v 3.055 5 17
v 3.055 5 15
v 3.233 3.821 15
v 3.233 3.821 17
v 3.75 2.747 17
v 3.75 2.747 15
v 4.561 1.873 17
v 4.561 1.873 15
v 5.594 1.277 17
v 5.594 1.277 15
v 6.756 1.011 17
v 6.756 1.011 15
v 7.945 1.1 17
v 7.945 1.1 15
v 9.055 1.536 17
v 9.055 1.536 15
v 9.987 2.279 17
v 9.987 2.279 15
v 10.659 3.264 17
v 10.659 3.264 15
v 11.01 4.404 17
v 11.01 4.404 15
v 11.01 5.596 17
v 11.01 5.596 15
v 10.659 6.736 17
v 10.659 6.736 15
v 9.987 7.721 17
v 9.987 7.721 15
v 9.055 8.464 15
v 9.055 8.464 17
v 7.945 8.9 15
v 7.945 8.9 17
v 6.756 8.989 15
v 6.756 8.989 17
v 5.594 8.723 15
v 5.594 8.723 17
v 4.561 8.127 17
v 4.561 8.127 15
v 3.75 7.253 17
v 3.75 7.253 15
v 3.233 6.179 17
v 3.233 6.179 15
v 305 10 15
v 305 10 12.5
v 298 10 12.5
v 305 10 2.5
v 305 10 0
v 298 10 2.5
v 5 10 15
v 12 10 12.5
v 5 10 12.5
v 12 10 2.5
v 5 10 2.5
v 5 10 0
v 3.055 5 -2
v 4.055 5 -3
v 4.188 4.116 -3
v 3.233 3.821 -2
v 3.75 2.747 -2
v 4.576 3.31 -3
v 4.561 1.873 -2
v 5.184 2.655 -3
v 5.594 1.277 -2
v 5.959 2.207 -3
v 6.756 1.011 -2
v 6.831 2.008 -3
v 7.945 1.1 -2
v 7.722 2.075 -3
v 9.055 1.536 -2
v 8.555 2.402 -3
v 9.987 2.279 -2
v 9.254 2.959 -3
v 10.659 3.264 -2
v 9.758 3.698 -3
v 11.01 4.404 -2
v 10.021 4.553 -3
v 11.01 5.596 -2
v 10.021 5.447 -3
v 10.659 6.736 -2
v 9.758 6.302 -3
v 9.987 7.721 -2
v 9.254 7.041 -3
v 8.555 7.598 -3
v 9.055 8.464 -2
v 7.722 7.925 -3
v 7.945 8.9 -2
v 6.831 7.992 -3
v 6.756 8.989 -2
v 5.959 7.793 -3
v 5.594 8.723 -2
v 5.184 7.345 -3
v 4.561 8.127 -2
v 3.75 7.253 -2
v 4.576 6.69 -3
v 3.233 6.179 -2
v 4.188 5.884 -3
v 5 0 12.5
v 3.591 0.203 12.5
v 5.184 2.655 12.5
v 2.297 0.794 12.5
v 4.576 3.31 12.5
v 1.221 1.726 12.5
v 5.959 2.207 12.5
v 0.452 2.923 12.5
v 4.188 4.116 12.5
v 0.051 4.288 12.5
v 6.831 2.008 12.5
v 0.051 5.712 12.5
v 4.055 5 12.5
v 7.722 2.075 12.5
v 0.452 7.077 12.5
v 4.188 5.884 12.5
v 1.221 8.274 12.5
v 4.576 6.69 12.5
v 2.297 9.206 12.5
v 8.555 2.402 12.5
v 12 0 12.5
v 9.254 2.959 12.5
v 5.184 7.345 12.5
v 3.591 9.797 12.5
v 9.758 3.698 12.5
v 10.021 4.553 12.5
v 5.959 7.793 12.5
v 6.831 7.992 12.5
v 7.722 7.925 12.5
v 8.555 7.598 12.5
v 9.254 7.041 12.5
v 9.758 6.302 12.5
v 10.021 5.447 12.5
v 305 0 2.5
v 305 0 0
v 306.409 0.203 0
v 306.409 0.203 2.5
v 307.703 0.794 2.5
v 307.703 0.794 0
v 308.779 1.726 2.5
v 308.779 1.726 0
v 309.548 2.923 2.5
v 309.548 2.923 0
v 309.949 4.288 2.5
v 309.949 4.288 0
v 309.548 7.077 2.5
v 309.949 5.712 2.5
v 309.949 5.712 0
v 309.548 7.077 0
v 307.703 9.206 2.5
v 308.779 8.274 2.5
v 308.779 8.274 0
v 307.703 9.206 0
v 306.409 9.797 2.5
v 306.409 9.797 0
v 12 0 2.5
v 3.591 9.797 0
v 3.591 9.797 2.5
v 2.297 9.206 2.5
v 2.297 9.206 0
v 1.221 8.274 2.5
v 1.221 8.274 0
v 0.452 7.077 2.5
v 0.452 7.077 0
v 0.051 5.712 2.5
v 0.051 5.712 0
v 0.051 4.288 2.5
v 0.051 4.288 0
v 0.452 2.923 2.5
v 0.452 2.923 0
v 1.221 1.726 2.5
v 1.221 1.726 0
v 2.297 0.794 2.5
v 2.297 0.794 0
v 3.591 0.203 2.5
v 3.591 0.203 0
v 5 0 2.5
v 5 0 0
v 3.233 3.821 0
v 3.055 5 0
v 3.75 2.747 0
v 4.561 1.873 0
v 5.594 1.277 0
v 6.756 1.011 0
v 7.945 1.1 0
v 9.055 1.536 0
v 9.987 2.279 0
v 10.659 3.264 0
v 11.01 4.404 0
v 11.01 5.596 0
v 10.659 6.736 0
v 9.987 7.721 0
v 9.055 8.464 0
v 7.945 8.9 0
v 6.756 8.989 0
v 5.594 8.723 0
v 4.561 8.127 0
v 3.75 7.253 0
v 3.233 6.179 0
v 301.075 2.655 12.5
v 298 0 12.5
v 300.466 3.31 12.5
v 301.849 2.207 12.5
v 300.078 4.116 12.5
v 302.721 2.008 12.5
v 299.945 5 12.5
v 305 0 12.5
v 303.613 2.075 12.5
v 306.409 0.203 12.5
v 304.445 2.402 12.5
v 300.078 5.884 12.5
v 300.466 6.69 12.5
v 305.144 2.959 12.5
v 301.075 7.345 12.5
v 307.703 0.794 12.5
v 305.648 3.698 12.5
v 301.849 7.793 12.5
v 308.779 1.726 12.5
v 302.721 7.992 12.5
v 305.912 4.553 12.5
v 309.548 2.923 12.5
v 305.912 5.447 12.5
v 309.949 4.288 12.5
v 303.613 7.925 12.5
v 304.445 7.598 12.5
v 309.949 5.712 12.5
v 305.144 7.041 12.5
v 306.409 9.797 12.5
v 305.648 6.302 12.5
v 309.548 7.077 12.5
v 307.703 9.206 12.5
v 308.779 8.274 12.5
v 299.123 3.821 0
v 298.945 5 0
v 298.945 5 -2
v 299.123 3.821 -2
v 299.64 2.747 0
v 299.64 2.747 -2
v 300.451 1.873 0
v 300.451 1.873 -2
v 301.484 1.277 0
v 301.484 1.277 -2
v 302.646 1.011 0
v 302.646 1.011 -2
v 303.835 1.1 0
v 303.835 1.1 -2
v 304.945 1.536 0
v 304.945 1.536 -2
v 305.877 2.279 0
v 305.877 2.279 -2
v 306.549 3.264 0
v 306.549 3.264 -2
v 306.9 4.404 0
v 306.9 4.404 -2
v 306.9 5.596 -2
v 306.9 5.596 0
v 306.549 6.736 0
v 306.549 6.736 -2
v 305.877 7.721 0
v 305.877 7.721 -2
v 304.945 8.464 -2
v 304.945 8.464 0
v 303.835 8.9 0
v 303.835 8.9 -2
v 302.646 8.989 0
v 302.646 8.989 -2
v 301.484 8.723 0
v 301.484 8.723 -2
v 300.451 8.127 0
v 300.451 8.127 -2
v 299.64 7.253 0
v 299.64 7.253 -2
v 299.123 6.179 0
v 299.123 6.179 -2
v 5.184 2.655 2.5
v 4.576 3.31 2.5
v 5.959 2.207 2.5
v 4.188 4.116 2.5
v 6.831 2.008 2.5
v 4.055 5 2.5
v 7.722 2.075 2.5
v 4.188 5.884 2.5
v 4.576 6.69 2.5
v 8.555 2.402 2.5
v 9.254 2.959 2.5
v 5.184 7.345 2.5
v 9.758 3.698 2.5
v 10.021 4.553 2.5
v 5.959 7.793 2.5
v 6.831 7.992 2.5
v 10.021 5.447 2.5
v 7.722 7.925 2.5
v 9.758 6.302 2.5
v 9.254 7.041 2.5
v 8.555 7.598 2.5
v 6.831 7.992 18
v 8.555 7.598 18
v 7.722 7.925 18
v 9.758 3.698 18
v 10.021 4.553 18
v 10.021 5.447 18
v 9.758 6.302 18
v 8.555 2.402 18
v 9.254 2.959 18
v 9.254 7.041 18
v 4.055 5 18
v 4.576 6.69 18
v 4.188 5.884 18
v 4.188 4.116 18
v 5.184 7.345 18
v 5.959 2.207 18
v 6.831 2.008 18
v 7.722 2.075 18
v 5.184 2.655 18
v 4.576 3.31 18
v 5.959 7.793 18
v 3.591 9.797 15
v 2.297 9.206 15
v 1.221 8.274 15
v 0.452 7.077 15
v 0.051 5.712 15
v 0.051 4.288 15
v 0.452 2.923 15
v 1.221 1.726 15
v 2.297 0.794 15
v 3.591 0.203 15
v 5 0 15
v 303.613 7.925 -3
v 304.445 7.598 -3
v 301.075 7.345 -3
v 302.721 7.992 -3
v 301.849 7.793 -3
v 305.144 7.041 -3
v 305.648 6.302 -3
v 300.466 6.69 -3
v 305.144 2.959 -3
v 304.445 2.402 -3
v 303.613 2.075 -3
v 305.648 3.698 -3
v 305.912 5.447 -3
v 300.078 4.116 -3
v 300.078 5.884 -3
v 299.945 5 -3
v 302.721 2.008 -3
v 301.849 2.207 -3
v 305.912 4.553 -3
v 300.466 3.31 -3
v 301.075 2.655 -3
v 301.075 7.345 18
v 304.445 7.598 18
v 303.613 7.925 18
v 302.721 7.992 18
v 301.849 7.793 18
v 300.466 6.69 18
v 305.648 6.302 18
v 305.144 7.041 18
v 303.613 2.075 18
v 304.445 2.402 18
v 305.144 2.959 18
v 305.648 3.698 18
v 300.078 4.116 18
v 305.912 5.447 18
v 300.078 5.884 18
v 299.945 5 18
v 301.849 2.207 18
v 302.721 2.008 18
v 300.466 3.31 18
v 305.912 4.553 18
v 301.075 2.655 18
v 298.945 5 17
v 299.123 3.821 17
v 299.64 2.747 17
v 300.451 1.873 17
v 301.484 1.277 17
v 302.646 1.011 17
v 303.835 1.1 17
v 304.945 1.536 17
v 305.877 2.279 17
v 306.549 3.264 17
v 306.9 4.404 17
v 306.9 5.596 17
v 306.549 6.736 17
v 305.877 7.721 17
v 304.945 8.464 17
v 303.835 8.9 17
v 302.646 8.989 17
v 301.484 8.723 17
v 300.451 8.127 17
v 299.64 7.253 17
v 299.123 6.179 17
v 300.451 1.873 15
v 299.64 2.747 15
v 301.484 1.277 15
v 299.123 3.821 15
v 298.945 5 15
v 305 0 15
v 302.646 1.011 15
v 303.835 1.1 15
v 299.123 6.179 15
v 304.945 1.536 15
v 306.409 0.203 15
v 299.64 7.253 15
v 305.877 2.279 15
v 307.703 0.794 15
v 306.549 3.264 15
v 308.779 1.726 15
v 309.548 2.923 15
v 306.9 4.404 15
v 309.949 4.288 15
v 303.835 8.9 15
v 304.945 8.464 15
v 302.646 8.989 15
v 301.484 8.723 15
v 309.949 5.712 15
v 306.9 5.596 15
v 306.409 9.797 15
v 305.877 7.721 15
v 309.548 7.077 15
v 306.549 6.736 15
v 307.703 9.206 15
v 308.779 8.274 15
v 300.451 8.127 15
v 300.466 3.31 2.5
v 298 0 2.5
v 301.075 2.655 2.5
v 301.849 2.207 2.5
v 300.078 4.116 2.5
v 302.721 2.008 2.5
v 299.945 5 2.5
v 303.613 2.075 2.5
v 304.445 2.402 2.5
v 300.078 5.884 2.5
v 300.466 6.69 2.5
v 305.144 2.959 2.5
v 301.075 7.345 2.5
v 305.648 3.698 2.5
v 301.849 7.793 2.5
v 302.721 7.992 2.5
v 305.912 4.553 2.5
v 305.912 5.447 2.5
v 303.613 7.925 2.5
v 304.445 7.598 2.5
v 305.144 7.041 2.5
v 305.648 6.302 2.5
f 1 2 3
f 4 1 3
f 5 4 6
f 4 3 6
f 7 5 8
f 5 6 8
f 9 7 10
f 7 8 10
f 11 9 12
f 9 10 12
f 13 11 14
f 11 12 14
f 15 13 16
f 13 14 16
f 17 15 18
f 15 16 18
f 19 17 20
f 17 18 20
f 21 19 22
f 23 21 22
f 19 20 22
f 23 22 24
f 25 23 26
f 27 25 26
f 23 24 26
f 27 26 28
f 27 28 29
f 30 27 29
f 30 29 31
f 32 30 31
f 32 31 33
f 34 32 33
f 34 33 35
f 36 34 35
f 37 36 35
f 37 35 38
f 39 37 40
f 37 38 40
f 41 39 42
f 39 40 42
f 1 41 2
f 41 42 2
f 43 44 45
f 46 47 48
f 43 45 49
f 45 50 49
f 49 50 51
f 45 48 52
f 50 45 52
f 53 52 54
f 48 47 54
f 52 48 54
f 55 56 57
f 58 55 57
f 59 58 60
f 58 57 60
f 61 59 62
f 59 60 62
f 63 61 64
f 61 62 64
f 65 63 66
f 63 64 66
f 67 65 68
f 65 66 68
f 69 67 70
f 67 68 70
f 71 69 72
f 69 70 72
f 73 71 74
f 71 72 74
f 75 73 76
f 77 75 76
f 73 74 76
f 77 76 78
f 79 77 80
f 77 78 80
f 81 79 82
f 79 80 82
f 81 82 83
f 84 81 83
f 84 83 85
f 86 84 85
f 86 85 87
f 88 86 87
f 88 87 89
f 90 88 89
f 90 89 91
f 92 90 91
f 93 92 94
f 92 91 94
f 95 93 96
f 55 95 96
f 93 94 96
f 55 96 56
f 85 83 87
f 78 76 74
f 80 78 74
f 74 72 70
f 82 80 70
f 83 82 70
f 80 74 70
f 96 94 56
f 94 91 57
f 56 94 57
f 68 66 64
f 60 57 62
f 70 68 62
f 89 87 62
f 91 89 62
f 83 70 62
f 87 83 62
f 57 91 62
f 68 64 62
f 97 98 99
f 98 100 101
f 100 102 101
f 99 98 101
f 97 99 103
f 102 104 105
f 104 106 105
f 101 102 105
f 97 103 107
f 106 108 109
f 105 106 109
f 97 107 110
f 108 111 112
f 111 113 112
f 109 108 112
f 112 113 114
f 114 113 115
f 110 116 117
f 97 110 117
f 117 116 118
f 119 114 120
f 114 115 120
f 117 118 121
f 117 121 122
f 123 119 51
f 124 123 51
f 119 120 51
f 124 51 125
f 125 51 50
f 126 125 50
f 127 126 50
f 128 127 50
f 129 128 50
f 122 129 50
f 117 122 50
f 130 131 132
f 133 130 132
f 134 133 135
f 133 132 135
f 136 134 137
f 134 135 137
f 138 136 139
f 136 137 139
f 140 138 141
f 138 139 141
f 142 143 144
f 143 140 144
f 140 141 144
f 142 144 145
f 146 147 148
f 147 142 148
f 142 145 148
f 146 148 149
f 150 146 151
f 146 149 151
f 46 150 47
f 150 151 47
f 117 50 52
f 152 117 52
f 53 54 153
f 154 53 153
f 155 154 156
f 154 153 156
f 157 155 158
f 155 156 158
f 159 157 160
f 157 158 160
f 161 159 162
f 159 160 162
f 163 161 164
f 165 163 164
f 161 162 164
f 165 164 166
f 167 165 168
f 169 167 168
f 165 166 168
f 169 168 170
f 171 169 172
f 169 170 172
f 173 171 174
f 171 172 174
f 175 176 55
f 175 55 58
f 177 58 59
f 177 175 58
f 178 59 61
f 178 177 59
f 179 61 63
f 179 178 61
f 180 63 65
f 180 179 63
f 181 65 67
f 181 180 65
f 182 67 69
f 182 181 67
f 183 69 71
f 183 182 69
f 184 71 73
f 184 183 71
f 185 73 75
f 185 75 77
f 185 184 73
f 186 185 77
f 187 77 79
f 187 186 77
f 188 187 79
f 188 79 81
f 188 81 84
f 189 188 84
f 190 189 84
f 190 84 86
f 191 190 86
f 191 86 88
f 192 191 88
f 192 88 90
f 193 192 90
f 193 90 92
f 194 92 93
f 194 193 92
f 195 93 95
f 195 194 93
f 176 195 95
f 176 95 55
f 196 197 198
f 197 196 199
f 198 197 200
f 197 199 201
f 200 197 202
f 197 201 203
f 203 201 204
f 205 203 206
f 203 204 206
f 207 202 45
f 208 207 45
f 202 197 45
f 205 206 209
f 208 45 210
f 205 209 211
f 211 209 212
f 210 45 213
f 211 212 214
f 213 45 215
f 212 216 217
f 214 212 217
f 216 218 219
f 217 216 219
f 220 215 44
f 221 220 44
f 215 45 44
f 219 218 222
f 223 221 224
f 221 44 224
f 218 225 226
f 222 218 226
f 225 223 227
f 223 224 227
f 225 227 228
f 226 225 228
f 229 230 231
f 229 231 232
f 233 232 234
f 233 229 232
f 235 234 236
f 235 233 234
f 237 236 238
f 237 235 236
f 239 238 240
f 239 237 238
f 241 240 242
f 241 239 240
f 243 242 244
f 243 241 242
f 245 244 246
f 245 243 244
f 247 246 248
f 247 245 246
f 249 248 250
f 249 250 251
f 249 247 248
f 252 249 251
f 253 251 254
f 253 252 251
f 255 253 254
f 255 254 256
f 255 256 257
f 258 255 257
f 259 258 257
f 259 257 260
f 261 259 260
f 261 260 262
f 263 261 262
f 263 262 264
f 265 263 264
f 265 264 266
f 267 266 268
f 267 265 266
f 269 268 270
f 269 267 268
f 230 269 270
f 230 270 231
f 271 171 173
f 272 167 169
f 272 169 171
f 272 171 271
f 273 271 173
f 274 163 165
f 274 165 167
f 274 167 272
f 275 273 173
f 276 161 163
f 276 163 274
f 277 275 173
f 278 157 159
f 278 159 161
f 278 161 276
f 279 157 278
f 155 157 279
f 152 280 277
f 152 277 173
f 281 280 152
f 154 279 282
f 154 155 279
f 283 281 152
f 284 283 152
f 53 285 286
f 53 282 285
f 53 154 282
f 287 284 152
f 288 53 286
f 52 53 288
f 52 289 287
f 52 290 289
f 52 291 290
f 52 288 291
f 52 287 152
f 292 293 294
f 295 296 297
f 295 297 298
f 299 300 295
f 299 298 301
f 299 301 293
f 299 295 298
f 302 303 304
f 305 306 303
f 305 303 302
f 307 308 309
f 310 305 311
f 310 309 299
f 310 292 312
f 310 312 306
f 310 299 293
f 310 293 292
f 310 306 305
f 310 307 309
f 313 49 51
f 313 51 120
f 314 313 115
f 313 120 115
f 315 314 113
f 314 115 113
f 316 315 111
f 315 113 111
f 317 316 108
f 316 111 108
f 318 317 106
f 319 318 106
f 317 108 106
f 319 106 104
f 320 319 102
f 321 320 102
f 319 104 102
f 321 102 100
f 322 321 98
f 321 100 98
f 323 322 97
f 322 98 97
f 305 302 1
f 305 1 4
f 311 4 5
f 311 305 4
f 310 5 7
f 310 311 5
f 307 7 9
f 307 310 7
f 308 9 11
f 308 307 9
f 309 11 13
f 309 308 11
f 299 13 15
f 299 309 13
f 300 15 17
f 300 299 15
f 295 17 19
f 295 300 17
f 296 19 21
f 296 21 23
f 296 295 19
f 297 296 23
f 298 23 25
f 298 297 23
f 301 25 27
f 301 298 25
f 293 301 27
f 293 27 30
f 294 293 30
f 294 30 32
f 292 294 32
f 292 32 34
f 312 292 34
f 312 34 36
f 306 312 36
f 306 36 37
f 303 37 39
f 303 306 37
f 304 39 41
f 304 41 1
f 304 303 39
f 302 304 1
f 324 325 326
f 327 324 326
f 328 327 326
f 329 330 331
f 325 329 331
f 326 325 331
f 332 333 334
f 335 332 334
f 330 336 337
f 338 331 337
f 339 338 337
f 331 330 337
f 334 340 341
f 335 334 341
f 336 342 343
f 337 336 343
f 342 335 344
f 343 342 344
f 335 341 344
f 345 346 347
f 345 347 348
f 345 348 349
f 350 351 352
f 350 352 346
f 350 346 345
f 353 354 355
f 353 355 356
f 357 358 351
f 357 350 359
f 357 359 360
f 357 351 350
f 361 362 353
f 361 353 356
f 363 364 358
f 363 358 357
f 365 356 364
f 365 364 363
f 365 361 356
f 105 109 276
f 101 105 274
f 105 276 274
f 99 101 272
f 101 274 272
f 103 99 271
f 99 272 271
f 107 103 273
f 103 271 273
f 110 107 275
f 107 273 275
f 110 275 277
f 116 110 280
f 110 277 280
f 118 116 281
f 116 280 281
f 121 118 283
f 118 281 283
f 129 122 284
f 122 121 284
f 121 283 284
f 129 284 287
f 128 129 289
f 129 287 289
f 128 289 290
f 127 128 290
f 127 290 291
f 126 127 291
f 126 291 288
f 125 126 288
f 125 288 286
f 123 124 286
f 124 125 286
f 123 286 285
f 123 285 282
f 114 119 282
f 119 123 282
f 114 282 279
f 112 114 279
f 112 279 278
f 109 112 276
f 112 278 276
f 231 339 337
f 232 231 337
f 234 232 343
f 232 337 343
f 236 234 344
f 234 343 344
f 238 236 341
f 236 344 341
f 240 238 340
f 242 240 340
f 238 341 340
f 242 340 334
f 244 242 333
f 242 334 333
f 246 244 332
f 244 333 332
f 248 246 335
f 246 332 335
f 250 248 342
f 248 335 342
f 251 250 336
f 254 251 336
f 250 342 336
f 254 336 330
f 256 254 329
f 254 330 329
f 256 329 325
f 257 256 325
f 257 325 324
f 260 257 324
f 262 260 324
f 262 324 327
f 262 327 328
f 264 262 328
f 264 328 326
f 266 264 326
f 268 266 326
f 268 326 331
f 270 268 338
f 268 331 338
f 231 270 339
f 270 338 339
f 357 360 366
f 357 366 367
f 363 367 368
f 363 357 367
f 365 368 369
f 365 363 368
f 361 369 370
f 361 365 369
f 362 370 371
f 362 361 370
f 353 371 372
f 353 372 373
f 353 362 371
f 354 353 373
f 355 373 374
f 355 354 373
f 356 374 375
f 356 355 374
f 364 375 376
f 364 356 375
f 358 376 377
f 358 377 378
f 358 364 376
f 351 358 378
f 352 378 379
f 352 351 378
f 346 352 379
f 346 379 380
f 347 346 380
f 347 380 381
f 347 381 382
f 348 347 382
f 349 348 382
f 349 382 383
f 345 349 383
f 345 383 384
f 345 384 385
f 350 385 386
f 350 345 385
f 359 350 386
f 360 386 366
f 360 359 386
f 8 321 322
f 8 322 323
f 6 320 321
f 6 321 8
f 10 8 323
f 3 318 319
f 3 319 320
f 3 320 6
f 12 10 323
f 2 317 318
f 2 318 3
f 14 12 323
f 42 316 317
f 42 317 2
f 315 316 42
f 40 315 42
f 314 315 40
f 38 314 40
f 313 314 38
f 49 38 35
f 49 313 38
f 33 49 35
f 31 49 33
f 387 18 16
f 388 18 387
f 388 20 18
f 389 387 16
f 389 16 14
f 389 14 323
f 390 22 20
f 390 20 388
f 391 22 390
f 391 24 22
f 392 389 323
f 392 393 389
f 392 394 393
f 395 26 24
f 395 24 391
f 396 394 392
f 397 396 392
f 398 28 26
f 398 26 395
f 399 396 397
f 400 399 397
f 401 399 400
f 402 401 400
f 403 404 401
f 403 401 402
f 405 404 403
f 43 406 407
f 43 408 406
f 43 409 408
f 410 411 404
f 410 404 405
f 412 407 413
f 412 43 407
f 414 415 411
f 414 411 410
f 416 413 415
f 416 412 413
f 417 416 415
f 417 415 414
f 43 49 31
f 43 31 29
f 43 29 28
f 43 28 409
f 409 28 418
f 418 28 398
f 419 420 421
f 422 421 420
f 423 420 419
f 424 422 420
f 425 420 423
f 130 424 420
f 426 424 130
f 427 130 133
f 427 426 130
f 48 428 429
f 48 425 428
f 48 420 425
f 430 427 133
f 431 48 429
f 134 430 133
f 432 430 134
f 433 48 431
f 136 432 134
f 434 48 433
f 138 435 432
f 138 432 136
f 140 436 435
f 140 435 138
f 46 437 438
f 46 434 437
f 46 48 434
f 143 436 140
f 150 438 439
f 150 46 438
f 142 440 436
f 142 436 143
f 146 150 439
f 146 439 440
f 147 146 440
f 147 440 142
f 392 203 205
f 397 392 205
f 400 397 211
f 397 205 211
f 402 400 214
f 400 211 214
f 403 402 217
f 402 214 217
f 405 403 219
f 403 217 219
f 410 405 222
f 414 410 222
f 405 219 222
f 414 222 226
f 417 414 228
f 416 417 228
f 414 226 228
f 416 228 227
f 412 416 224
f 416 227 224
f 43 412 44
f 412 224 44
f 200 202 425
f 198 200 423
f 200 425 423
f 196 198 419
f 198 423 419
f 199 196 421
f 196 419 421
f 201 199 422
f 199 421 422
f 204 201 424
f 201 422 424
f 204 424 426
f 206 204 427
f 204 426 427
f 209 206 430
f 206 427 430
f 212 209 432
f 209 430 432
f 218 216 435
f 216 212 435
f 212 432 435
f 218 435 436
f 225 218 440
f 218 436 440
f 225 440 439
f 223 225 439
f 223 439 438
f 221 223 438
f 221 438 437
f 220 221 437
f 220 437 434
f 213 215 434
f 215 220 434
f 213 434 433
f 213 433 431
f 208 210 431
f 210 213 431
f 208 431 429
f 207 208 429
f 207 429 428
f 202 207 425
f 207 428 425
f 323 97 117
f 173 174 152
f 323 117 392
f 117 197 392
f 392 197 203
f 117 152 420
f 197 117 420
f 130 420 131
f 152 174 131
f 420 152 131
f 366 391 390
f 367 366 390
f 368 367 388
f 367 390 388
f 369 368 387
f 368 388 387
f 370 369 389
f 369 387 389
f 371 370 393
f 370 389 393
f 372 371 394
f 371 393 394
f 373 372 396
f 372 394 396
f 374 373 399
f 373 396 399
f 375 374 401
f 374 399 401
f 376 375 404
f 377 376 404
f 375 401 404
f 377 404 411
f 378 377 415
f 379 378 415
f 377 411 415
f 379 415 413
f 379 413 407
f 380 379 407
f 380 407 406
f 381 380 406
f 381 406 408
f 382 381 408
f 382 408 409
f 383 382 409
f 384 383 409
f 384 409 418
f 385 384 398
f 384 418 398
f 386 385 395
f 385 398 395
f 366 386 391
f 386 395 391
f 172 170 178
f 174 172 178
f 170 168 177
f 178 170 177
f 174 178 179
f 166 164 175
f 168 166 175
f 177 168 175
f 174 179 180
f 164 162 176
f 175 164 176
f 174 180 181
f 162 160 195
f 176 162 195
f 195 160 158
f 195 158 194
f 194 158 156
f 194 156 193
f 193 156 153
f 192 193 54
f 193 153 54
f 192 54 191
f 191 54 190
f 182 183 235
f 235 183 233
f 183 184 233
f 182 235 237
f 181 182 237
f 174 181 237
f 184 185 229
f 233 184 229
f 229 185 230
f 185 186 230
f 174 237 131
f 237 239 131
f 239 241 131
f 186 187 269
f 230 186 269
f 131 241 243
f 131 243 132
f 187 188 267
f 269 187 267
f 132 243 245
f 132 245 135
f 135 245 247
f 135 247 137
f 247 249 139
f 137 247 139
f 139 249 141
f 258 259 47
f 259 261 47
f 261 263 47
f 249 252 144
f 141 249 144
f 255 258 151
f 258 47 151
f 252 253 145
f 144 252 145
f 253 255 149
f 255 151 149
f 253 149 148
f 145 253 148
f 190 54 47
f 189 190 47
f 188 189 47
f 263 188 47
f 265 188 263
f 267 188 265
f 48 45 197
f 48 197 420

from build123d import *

# Parameters (mm, degrees)
BOSS_EXTRU_1_DEPTH           = 15
ENL_V_MAT_EXTRU_1_REACH      = 312.524
ESQUISSE2_W                  = 12
ESQUISSE2_H                  = 10
BOSS_EXTRU_2_REACH           = 312.413
ESQUISSE3_R                  = 3
ESQUISSE4_R                  = 4
BOSS_EXTRU_3_DEPTH           = 3
CHANFREIN1_SIZE              = 1
CHANFREIN1_OF_SYM_TRIE1_SIZE = 1


with BuildPart() as part:
    # Esquisse1 → Boss.-Extru.1 (new body)
    with BuildSketch(Plane.XY):
        with BuildLine():
            Line((5, 0), (305, 0))
            ThreePointArc((305, 0), (310, 5), (305, 10))
            Line((305, 10), (5, 10))
            ThreePointArc((5, 10), (0, 5), (5, 0))
        make_face()
    extrude(amount=BOSS_EXTRU_1_DEPTH)

    # Esquisse2 → Enlèv. mat.-Extru.1 (cut, up to next)
    with BuildSketch(Plane(origin=(0, 10, 0), x_dir=(1, 0, 0), z_dir=(0, 1, 0)), mode=Mode.PRIVATE) as enl_v_mat_extru_1_sk1:
        with Locations((6, -7.5)):
            Rectangle(ESQUISSE2_W, ESQUISSE2_H)
    enl_v_mat_extru_1_tool1 = extrude(enl_v_mat_extru_1_sk1.sketch, amount=-ENL_V_MAT_EXTRU_1_REACH, mode=Mode.PRIVATE) & part.part
    # Esquisse2 → Enlèv. mat.-Extru.1 (cut, up to next)
    with BuildSketch(Plane(origin=(0, 10, 0), x_dir=(1, 0, 0), z_dir=(0, 1, 0)), mode=Mode.PRIVATE) as enl_v_mat_extru_1_sk2:
        with Locations((304, -7.5)):
            Rectangle(ESQUISSE2_W, ESQUISSE2_H)
    enl_v_mat_extru_1_tool2 = extrude(enl_v_mat_extru_1_sk2.sketch, amount=-ENL_V_MAT_EXTRU_1_REACH, mode=Mode.PRIVATE) & part.part
    add(enl_v_mat_extru_1_tool1.solids().sort_by_distance((6, 10, 7.5))[0], mode=Mode.SUBTRACT)
    add(enl_v_mat_extru_1_tool2.solids().sort_by_distance((304, 10, 7.5))[0], mode=Mode.SUBTRACT)

    # Esquisse3 → Boss.-Extru.2 (add, up to next)
    with BuildSketch(Plane.XY.offset(2.5), mode=Mode.PRIVATE) as boss_extru_2_sk1:
        with Locations(Location((7.054871053, 5, 0), (0, 0, 180))):
            Circle(ESQUISSE3_R)
    boss_extru_2_tool1 = extrude(boss_extru_2_sk1.sketch, amount=BOSS_EXTRU_2_REACH, mode=Mode.PRIVATE) - part.part
    # Esquisse3 → Boss.-Extru.2 (add, up to next)
    with BuildSketch(Plane.XY.offset(2.5), mode=Mode.PRIVATE) as boss_extru_2_sk2:
        with Locations(Location((302.945128947, 5, 0), (0, 0, 180))):
            Circle(ESQUISSE3_R)
    boss_extru_2_tool2 = extrude(boss_extru_2_sk2.sketch, amount=BOSS_EXTRU_2_REACH, mode=Mode.PRIVATE) - part.part
    add(boss_extru_2_tool1.solids().sort_by_distance((7.054871, 5, 2.5))[0])
    add(boss_extru_2_tool2.solids().sort_by_distance((302.945129, 5, 2.5))[0])

    # Esquisse4 → Boss.-Extru.3 (add)
    with BuildSketch(Plane.XY.offset(15)):
        with Locations(Location((7.054871053, 5, 0), (0, 0, 180))):
            Circle(ESQUISSE4_R)
        with Locations(Location((302.945128947, 5, 0), (0, 0, 180))):
            Circle(ESQUISSE4_R)
    boss_extru_3 = extrude(amount=BOSS_EXTRU_3_DEPTH)

    # Chanfrein1
    chanfrein1_edges = [part.edges().sort_by_distance(p)[0] for p in [
        (11.054871053, 5, 18),
        (306.945128947, 5, 18),
    ]]
    chamfer(chanfrein1_edges, length=CHANFREIN1_SIZE)

    # Symétrie1: Boss.-Extru.3 across plane
    add(boss_extru_3.mirror(Plane.XY.offset(7.5)))

    # Chanfrein1 of Symétrie1
    chanfrein1_of_sym_trie1_edges = [part.edges().sort_by_distance(p)[0] for p in [
        (11.054871053, 5, -3),
        (306.945128947, 5, -3),
    ]]
    chamfer(chanfrein1_of_sym_trie1_edges, length=CHANFREIN1_OF_SYM_TRIE1_SIZE)


solid = part.part
